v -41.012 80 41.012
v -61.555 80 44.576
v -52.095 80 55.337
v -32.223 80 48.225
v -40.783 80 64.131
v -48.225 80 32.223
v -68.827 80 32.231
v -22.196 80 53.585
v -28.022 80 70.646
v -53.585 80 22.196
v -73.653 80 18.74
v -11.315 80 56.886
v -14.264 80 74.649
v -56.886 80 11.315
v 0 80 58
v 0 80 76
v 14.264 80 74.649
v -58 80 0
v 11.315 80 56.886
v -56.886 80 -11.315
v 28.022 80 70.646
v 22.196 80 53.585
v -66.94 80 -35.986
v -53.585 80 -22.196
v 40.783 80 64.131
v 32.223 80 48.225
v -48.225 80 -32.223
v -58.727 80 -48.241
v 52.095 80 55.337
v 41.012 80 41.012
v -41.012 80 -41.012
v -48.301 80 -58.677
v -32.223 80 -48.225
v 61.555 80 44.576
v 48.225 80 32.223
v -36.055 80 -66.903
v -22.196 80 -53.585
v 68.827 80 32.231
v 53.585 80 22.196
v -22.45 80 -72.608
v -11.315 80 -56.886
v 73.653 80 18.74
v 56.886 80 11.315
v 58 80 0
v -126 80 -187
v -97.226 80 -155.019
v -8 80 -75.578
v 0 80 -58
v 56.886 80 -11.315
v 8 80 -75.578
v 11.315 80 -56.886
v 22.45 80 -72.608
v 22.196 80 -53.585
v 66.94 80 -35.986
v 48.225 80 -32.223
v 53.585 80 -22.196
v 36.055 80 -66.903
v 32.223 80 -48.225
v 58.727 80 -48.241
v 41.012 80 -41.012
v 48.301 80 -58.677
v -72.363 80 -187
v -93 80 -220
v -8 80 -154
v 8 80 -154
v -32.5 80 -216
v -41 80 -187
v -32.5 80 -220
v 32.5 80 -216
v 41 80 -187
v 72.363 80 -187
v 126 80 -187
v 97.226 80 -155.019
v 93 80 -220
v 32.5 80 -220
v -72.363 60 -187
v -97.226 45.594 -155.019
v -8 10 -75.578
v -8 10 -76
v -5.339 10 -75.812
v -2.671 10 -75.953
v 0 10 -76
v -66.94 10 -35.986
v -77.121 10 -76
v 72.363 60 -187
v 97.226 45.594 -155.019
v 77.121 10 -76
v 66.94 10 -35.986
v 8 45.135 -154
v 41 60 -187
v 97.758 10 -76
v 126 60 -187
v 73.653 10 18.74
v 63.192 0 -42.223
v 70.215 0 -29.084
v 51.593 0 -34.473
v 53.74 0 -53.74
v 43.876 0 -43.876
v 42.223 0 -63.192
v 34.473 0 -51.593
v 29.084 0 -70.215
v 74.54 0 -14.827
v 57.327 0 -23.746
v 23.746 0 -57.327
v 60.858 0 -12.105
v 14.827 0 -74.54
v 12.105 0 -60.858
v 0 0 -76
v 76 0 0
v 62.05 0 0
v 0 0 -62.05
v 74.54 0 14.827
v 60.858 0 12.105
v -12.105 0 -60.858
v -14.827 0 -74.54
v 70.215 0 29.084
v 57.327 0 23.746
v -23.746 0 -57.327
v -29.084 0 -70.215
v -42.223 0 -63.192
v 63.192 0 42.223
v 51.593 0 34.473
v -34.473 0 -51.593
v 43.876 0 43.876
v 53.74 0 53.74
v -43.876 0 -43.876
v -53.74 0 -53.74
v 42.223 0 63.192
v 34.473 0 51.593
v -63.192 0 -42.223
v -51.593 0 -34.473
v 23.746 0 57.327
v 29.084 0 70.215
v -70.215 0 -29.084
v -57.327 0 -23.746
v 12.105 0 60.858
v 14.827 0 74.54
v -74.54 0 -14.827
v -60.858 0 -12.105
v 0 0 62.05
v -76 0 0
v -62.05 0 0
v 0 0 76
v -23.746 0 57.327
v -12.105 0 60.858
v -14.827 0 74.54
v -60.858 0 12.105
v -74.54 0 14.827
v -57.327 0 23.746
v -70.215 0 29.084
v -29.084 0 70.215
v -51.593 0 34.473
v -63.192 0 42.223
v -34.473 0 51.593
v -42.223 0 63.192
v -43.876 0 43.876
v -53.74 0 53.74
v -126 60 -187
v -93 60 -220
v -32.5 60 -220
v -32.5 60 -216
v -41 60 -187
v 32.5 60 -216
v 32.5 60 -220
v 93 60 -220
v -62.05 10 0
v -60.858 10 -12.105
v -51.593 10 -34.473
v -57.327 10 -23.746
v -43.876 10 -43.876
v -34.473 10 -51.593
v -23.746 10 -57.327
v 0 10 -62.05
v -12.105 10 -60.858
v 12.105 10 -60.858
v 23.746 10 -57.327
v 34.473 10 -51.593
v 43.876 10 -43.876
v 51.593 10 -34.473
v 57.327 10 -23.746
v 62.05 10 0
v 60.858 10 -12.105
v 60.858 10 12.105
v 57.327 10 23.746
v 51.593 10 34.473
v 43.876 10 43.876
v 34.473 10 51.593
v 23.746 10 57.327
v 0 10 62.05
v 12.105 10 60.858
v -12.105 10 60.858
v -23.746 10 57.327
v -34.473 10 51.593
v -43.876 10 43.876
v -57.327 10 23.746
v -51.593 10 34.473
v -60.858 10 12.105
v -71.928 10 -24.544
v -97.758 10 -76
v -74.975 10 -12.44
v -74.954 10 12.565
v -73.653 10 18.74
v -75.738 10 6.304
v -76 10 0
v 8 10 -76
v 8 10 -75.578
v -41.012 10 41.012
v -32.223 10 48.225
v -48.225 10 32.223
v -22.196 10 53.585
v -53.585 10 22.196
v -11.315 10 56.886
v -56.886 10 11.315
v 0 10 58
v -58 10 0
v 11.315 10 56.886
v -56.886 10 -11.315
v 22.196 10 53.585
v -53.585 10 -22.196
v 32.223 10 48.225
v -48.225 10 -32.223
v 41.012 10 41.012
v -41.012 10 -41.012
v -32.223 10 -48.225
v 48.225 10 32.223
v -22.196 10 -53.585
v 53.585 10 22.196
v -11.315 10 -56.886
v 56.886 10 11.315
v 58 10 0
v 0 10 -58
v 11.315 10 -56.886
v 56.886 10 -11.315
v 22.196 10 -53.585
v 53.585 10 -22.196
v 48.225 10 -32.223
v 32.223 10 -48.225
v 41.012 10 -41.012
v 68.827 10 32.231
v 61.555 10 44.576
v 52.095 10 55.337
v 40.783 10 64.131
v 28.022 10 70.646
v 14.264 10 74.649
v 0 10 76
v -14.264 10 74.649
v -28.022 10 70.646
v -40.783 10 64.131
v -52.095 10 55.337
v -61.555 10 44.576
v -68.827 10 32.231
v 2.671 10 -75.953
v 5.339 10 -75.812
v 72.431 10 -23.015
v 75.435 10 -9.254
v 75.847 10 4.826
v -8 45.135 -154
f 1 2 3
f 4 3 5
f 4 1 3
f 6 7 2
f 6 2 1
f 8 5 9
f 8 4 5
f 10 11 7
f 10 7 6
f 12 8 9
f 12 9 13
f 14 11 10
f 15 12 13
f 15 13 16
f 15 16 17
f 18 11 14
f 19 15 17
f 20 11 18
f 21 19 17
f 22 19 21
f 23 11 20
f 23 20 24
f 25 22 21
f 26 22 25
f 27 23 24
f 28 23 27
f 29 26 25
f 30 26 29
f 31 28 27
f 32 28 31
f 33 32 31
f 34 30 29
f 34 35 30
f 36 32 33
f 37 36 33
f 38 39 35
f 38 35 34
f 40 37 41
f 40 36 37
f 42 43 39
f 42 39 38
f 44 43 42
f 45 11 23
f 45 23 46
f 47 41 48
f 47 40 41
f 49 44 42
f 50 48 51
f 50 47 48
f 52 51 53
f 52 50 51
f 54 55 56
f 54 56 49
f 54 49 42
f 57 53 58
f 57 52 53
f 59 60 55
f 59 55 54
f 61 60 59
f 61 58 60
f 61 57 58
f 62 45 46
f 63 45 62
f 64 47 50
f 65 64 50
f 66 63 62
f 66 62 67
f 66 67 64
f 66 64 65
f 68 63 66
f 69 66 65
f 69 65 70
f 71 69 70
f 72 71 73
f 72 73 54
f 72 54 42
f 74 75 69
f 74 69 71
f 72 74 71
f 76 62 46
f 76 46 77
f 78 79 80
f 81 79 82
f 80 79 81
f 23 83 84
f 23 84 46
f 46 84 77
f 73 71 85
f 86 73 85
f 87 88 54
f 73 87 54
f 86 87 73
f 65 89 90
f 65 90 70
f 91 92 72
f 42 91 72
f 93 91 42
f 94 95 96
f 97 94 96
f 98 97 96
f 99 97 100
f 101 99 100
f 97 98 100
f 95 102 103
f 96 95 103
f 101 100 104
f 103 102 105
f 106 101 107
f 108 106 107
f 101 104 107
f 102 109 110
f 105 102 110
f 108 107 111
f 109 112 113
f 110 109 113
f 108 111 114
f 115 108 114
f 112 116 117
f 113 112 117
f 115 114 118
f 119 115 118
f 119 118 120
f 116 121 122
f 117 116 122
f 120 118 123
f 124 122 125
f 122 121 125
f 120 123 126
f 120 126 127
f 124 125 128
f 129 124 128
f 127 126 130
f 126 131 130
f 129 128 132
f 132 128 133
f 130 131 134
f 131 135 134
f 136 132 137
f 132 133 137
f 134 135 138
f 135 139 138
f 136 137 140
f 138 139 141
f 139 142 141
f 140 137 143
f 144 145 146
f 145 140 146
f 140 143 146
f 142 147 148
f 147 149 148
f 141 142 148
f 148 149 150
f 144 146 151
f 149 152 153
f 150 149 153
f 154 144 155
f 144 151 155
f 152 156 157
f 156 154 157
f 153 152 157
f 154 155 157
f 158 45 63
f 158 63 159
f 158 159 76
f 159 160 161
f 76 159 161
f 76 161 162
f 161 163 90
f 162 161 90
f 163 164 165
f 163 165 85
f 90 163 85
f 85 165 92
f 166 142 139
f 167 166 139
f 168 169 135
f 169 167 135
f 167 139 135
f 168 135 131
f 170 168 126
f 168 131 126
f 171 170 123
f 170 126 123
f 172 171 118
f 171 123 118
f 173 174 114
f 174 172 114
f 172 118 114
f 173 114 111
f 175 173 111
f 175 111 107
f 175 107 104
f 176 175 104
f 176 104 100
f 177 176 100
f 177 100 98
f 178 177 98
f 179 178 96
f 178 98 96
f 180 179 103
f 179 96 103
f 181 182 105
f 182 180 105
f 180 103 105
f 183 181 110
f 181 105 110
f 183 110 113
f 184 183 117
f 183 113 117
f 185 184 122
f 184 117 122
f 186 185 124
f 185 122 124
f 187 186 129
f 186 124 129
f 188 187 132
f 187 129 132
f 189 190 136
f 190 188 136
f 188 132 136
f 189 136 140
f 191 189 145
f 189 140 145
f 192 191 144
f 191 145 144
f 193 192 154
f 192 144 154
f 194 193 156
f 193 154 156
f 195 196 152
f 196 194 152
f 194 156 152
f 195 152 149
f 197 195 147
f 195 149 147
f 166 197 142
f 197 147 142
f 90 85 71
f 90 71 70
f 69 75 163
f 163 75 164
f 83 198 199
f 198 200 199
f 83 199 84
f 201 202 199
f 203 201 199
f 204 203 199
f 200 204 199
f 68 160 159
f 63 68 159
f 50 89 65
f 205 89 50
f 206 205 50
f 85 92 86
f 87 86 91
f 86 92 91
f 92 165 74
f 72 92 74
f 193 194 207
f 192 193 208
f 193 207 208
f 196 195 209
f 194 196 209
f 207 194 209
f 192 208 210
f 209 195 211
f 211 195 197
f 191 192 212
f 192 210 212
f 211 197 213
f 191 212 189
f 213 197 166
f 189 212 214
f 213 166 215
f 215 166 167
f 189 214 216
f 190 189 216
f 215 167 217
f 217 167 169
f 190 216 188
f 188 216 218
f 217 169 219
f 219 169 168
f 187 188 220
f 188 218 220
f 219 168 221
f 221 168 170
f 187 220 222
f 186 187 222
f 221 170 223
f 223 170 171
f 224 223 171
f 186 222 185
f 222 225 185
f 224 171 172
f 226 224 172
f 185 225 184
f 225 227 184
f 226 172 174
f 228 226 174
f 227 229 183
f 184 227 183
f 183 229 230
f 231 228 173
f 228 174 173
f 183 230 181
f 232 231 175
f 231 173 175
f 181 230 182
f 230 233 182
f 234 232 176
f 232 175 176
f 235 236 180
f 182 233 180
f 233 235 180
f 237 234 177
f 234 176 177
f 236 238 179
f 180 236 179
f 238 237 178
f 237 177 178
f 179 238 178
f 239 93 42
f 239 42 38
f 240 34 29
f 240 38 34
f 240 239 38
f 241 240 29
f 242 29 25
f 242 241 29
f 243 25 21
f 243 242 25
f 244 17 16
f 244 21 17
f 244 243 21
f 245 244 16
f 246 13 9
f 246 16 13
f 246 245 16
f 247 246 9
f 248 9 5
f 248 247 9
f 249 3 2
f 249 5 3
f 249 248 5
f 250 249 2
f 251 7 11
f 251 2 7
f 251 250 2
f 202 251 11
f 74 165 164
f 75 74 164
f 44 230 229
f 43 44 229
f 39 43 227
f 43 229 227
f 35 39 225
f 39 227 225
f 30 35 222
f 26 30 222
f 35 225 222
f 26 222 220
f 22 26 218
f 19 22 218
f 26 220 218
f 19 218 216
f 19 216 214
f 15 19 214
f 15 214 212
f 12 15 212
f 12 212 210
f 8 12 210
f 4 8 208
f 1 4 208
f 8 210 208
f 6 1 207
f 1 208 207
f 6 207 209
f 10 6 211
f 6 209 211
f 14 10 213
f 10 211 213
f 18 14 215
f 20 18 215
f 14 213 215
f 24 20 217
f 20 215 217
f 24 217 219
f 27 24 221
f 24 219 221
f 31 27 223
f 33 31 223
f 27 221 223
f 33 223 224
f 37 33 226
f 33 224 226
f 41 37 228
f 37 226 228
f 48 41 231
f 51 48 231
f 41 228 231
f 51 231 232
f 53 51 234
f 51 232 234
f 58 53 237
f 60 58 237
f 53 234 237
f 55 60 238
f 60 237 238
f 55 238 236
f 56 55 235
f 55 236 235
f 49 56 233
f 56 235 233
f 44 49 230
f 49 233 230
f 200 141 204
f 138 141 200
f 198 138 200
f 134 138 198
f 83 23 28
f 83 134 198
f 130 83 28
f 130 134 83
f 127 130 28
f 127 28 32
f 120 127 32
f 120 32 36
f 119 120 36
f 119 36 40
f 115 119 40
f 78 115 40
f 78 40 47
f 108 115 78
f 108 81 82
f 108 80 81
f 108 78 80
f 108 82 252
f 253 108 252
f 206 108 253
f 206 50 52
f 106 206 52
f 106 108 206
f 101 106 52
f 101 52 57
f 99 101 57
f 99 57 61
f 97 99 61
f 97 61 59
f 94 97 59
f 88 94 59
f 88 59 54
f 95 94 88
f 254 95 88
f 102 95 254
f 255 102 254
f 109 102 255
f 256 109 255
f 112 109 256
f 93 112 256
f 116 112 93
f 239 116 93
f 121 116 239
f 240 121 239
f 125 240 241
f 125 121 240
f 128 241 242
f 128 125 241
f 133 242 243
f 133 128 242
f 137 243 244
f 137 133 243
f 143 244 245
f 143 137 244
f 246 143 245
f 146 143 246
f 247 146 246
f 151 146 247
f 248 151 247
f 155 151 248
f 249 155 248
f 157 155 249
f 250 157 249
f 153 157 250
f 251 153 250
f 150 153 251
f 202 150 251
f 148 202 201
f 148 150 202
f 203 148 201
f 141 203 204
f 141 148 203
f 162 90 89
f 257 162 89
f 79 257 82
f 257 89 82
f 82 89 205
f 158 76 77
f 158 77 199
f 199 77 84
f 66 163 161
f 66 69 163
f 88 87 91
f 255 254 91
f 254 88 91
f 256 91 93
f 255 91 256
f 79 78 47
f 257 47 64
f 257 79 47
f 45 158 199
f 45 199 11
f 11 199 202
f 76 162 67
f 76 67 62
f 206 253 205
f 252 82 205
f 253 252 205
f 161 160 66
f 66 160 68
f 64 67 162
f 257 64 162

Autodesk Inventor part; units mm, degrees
ref_plane "YZ Plane" through (0, 0, 0) normal (1, 0, 0) x (0, 1, 0)
ref_plane "XZ Plane" through (0, 0, 0) normal (0, 1, 0) x (-1, 0, 0)
ref_plane "XY Plane" through (0, 0, 0) normal (0, 0, 1) x (1, 0, 0)
sketch "Sketch1" plane through (0, 0, 0) normal (0, 1, 0) x (-1, 0, 0)
  circle A0 centre (0, 0) radius 62.05
  circle A1 centre (0, 0) radius 76
  dimension "d0" = 124.1
extrude "Extrusion1" add sketch "Sketch1" along normal blind 10
sketch "Sketch2" plane through (0, 10, 0) normal (0, 1, 0) x (1, 0, 0)
  circle A0 centre (0, 0) radius 76 projected
  circle A1 centre (0, 0) radius 62.05 projected
  line L0 (-76, 0) -> (76, 0)
  line L1 (76, 0) -> (76, 220)
  line L2 (76, 220) -> (-76, 220)
  line L3 (-76, 220) -> (-76, 0)
  line L4 (-126, 220) -> (126, 220)
  line L5 (126, 220) -> (126, 187)
  line L6 (126, 187) -> (-126, 187)
  line L7 (-126, 187) -> (-126, 220)
  line L8 (126, 187) -> (73.6534, -18.7397)
  circle A2 centre (0, 0) radius 76 projected
  line L9 (-126, 187) -> (-73.6534, -18.7397)
  point P0 (-73.6534, -18.7397)
  point P1 (73.6534, -18.7397)
  dimension "d3" = 220
  dimension "d4" = 50
  dimension "d5" = 50
  dimension "d15" = 33
  dimension "d16" = 76
  dimension "d17" = 76
  dimension "d18" = 126
extrude "Extrusion2" add sketch "Sketch2" along normal blind 70
sketch "Sketch3" plane through (126, 10, -187) normal (1, 0, 0) x (0, 0, -1)
  line L0 (39, 50) -> (0, 50)
  line L1 (0, 0) -> (0, 70) projected
  line L2 (0, 50) -> (-111, 0)
  line L3 (-205.7397, 0) -> (0, 0) projected
  line L4 (39, 50) -> (39, 0)
  line L5 (39, 0) -> (-111, 0)
  line L6 (0, 70) -> (33, 70) projected
  point P0 (-187, -10)
  dimension "d10" = 20
extrude "Extrusion3" cut sketch "Sketch3" against normal blind 300
sketch "Sketch4" plane through (0, 10, 0) normal (0, -1, 0) x (1, 0, 0)
  circle A0 centre (0, 0) radius 58
  line L0 (-97.7581, -76) -> (97.7581, -76) projected
  circle A1 centre (0, 0) radius 76
  line L1 (126, -220) -> (-126, -220) projected
  line L2 (126, -187) -> (126, -220) projected
  line L3 (126, -187) -> (-126, -187) projected
  line L4 (-126, -220) -> (-126, -187) projected
  line L5 (97.7581, -76) -> (126, -187) projected
  line L6 (0, -76) -> (97.7581, -76) projected
  line L7 (-97.7581, -76) -> (0, -76) projected
  line L8 (-126, -187) -> (-97.7581, -76) projected
  line L9 (126, -187) -> (-126, -187) projected
  line L10 (0, -76) -> (97.7581, -76) projected
  line L11 (73.6534, 18.7397) -> (97.7581, -76) projected
  arc A2 (0, -76) -> (73.6534, 18.7397) centre (0, 0) ccw projected
  line L12 (-97.7581, -76) -> (0, -76) projected
  arc A3 (-73.6534, 18.7397) -> (0, -76) centre (0, 0) ccw projected
  line L13 (-97.7581, -76) -> (-73.6534, 18.7397) projected
  line L14 (64.6258, -26.8898) -> (109.6331, -203.7836)
  line L15 (-65.3309, -29.6614) -> (-109.9518, -205.0363)
  line L16 (8, -74) -> (-8, -74)
  line L17 (-8, -74) -> (-8, -228)
  line L18 (-8, -228) -> (8, -228)
  line L19 (8, -228) -> (8, -74)
  line L20 (0, -76) -> (97.7581, -76) projected
  circle A4 centre (0, 0) radius 62.05 projected
  line L21 (73.6534, 18.7397) -> (97.7581, -76) projected
  arc A5 (0, -76) -> (73.6534, 18.7397) centre (0, 0) ccw projected
  line L22 (-97.7581, -76) -> (0, -76) projected
  circle A6 centre (0, 0) radius 62.05 projected
  arc A7 (-73.6534, 18.7397) -> (0, -76) centre (0, 0) ccw projected
  line L23 (-97.7581, -76) -> (-73.6534, 18.7397) projected
  point P0 (-8, -75.5778)
  point P1 (-66.9402, -35.9863)
  point P2 (-105.3628, -187)
  point P3 (-8, -187)
  point P4 (8, -187)
  point P5 (105.3628, -187)
  point P6 (66.9402, -35.9863)
  point P7 (8, -75.5778)
  dimension "d11" = 20
  dimension "d12" = 20
extrude "Extrusion5" cut sketch "Sketch4" against normal blind 300 contours A0 | L15 A1 L17 L0 | L0 L17 L3 L15 | L19 A1 L14 L0 | L0 L14 L3 L19
chamfer "Chamfer1" distance 33 angle 45 6 edges at (-126, 70, -220) (126, 70, -220) (105.3628, 70, -187) (-105.3628, 70, -187) (8, 70, -187) (-8, 70, -187)
sketch "Sketch7" plane through (93, 60, -220) normal (0, 0, -1) x (-1, 0, 0)
  line L0 (0, 20) -> (186, 20) projected
  line L1 (0, 0) -> (186, 0) projected
  line L2 (125.5, 20) -> (60.5, 20)
  line L3 (60.5, 20) -> (60.5, 0)
  line L4 (60.5, 0) -> (125.5, 0)
  line L5 (125.5, 0) -> (125.5, 20)
  line L6 (186, 20) -> (186, 0) projected
  line L7 (0, 0) -> (0, 20) projected
  point P0 (93, -60)
  point P1 (125.5, 0)
  point P2 (60.5, 20)
  dimension "d24" = 65
  dimension "d25" = 60.5
  dimension "d26" = 60.5
extrude "Extrusion6" cut sketch "Sketch7" against normal blind 4 contours L0 L5 L1 L3
properties part number "KrovatkaShatunPods" material "Aluminum 6061-AHC"
